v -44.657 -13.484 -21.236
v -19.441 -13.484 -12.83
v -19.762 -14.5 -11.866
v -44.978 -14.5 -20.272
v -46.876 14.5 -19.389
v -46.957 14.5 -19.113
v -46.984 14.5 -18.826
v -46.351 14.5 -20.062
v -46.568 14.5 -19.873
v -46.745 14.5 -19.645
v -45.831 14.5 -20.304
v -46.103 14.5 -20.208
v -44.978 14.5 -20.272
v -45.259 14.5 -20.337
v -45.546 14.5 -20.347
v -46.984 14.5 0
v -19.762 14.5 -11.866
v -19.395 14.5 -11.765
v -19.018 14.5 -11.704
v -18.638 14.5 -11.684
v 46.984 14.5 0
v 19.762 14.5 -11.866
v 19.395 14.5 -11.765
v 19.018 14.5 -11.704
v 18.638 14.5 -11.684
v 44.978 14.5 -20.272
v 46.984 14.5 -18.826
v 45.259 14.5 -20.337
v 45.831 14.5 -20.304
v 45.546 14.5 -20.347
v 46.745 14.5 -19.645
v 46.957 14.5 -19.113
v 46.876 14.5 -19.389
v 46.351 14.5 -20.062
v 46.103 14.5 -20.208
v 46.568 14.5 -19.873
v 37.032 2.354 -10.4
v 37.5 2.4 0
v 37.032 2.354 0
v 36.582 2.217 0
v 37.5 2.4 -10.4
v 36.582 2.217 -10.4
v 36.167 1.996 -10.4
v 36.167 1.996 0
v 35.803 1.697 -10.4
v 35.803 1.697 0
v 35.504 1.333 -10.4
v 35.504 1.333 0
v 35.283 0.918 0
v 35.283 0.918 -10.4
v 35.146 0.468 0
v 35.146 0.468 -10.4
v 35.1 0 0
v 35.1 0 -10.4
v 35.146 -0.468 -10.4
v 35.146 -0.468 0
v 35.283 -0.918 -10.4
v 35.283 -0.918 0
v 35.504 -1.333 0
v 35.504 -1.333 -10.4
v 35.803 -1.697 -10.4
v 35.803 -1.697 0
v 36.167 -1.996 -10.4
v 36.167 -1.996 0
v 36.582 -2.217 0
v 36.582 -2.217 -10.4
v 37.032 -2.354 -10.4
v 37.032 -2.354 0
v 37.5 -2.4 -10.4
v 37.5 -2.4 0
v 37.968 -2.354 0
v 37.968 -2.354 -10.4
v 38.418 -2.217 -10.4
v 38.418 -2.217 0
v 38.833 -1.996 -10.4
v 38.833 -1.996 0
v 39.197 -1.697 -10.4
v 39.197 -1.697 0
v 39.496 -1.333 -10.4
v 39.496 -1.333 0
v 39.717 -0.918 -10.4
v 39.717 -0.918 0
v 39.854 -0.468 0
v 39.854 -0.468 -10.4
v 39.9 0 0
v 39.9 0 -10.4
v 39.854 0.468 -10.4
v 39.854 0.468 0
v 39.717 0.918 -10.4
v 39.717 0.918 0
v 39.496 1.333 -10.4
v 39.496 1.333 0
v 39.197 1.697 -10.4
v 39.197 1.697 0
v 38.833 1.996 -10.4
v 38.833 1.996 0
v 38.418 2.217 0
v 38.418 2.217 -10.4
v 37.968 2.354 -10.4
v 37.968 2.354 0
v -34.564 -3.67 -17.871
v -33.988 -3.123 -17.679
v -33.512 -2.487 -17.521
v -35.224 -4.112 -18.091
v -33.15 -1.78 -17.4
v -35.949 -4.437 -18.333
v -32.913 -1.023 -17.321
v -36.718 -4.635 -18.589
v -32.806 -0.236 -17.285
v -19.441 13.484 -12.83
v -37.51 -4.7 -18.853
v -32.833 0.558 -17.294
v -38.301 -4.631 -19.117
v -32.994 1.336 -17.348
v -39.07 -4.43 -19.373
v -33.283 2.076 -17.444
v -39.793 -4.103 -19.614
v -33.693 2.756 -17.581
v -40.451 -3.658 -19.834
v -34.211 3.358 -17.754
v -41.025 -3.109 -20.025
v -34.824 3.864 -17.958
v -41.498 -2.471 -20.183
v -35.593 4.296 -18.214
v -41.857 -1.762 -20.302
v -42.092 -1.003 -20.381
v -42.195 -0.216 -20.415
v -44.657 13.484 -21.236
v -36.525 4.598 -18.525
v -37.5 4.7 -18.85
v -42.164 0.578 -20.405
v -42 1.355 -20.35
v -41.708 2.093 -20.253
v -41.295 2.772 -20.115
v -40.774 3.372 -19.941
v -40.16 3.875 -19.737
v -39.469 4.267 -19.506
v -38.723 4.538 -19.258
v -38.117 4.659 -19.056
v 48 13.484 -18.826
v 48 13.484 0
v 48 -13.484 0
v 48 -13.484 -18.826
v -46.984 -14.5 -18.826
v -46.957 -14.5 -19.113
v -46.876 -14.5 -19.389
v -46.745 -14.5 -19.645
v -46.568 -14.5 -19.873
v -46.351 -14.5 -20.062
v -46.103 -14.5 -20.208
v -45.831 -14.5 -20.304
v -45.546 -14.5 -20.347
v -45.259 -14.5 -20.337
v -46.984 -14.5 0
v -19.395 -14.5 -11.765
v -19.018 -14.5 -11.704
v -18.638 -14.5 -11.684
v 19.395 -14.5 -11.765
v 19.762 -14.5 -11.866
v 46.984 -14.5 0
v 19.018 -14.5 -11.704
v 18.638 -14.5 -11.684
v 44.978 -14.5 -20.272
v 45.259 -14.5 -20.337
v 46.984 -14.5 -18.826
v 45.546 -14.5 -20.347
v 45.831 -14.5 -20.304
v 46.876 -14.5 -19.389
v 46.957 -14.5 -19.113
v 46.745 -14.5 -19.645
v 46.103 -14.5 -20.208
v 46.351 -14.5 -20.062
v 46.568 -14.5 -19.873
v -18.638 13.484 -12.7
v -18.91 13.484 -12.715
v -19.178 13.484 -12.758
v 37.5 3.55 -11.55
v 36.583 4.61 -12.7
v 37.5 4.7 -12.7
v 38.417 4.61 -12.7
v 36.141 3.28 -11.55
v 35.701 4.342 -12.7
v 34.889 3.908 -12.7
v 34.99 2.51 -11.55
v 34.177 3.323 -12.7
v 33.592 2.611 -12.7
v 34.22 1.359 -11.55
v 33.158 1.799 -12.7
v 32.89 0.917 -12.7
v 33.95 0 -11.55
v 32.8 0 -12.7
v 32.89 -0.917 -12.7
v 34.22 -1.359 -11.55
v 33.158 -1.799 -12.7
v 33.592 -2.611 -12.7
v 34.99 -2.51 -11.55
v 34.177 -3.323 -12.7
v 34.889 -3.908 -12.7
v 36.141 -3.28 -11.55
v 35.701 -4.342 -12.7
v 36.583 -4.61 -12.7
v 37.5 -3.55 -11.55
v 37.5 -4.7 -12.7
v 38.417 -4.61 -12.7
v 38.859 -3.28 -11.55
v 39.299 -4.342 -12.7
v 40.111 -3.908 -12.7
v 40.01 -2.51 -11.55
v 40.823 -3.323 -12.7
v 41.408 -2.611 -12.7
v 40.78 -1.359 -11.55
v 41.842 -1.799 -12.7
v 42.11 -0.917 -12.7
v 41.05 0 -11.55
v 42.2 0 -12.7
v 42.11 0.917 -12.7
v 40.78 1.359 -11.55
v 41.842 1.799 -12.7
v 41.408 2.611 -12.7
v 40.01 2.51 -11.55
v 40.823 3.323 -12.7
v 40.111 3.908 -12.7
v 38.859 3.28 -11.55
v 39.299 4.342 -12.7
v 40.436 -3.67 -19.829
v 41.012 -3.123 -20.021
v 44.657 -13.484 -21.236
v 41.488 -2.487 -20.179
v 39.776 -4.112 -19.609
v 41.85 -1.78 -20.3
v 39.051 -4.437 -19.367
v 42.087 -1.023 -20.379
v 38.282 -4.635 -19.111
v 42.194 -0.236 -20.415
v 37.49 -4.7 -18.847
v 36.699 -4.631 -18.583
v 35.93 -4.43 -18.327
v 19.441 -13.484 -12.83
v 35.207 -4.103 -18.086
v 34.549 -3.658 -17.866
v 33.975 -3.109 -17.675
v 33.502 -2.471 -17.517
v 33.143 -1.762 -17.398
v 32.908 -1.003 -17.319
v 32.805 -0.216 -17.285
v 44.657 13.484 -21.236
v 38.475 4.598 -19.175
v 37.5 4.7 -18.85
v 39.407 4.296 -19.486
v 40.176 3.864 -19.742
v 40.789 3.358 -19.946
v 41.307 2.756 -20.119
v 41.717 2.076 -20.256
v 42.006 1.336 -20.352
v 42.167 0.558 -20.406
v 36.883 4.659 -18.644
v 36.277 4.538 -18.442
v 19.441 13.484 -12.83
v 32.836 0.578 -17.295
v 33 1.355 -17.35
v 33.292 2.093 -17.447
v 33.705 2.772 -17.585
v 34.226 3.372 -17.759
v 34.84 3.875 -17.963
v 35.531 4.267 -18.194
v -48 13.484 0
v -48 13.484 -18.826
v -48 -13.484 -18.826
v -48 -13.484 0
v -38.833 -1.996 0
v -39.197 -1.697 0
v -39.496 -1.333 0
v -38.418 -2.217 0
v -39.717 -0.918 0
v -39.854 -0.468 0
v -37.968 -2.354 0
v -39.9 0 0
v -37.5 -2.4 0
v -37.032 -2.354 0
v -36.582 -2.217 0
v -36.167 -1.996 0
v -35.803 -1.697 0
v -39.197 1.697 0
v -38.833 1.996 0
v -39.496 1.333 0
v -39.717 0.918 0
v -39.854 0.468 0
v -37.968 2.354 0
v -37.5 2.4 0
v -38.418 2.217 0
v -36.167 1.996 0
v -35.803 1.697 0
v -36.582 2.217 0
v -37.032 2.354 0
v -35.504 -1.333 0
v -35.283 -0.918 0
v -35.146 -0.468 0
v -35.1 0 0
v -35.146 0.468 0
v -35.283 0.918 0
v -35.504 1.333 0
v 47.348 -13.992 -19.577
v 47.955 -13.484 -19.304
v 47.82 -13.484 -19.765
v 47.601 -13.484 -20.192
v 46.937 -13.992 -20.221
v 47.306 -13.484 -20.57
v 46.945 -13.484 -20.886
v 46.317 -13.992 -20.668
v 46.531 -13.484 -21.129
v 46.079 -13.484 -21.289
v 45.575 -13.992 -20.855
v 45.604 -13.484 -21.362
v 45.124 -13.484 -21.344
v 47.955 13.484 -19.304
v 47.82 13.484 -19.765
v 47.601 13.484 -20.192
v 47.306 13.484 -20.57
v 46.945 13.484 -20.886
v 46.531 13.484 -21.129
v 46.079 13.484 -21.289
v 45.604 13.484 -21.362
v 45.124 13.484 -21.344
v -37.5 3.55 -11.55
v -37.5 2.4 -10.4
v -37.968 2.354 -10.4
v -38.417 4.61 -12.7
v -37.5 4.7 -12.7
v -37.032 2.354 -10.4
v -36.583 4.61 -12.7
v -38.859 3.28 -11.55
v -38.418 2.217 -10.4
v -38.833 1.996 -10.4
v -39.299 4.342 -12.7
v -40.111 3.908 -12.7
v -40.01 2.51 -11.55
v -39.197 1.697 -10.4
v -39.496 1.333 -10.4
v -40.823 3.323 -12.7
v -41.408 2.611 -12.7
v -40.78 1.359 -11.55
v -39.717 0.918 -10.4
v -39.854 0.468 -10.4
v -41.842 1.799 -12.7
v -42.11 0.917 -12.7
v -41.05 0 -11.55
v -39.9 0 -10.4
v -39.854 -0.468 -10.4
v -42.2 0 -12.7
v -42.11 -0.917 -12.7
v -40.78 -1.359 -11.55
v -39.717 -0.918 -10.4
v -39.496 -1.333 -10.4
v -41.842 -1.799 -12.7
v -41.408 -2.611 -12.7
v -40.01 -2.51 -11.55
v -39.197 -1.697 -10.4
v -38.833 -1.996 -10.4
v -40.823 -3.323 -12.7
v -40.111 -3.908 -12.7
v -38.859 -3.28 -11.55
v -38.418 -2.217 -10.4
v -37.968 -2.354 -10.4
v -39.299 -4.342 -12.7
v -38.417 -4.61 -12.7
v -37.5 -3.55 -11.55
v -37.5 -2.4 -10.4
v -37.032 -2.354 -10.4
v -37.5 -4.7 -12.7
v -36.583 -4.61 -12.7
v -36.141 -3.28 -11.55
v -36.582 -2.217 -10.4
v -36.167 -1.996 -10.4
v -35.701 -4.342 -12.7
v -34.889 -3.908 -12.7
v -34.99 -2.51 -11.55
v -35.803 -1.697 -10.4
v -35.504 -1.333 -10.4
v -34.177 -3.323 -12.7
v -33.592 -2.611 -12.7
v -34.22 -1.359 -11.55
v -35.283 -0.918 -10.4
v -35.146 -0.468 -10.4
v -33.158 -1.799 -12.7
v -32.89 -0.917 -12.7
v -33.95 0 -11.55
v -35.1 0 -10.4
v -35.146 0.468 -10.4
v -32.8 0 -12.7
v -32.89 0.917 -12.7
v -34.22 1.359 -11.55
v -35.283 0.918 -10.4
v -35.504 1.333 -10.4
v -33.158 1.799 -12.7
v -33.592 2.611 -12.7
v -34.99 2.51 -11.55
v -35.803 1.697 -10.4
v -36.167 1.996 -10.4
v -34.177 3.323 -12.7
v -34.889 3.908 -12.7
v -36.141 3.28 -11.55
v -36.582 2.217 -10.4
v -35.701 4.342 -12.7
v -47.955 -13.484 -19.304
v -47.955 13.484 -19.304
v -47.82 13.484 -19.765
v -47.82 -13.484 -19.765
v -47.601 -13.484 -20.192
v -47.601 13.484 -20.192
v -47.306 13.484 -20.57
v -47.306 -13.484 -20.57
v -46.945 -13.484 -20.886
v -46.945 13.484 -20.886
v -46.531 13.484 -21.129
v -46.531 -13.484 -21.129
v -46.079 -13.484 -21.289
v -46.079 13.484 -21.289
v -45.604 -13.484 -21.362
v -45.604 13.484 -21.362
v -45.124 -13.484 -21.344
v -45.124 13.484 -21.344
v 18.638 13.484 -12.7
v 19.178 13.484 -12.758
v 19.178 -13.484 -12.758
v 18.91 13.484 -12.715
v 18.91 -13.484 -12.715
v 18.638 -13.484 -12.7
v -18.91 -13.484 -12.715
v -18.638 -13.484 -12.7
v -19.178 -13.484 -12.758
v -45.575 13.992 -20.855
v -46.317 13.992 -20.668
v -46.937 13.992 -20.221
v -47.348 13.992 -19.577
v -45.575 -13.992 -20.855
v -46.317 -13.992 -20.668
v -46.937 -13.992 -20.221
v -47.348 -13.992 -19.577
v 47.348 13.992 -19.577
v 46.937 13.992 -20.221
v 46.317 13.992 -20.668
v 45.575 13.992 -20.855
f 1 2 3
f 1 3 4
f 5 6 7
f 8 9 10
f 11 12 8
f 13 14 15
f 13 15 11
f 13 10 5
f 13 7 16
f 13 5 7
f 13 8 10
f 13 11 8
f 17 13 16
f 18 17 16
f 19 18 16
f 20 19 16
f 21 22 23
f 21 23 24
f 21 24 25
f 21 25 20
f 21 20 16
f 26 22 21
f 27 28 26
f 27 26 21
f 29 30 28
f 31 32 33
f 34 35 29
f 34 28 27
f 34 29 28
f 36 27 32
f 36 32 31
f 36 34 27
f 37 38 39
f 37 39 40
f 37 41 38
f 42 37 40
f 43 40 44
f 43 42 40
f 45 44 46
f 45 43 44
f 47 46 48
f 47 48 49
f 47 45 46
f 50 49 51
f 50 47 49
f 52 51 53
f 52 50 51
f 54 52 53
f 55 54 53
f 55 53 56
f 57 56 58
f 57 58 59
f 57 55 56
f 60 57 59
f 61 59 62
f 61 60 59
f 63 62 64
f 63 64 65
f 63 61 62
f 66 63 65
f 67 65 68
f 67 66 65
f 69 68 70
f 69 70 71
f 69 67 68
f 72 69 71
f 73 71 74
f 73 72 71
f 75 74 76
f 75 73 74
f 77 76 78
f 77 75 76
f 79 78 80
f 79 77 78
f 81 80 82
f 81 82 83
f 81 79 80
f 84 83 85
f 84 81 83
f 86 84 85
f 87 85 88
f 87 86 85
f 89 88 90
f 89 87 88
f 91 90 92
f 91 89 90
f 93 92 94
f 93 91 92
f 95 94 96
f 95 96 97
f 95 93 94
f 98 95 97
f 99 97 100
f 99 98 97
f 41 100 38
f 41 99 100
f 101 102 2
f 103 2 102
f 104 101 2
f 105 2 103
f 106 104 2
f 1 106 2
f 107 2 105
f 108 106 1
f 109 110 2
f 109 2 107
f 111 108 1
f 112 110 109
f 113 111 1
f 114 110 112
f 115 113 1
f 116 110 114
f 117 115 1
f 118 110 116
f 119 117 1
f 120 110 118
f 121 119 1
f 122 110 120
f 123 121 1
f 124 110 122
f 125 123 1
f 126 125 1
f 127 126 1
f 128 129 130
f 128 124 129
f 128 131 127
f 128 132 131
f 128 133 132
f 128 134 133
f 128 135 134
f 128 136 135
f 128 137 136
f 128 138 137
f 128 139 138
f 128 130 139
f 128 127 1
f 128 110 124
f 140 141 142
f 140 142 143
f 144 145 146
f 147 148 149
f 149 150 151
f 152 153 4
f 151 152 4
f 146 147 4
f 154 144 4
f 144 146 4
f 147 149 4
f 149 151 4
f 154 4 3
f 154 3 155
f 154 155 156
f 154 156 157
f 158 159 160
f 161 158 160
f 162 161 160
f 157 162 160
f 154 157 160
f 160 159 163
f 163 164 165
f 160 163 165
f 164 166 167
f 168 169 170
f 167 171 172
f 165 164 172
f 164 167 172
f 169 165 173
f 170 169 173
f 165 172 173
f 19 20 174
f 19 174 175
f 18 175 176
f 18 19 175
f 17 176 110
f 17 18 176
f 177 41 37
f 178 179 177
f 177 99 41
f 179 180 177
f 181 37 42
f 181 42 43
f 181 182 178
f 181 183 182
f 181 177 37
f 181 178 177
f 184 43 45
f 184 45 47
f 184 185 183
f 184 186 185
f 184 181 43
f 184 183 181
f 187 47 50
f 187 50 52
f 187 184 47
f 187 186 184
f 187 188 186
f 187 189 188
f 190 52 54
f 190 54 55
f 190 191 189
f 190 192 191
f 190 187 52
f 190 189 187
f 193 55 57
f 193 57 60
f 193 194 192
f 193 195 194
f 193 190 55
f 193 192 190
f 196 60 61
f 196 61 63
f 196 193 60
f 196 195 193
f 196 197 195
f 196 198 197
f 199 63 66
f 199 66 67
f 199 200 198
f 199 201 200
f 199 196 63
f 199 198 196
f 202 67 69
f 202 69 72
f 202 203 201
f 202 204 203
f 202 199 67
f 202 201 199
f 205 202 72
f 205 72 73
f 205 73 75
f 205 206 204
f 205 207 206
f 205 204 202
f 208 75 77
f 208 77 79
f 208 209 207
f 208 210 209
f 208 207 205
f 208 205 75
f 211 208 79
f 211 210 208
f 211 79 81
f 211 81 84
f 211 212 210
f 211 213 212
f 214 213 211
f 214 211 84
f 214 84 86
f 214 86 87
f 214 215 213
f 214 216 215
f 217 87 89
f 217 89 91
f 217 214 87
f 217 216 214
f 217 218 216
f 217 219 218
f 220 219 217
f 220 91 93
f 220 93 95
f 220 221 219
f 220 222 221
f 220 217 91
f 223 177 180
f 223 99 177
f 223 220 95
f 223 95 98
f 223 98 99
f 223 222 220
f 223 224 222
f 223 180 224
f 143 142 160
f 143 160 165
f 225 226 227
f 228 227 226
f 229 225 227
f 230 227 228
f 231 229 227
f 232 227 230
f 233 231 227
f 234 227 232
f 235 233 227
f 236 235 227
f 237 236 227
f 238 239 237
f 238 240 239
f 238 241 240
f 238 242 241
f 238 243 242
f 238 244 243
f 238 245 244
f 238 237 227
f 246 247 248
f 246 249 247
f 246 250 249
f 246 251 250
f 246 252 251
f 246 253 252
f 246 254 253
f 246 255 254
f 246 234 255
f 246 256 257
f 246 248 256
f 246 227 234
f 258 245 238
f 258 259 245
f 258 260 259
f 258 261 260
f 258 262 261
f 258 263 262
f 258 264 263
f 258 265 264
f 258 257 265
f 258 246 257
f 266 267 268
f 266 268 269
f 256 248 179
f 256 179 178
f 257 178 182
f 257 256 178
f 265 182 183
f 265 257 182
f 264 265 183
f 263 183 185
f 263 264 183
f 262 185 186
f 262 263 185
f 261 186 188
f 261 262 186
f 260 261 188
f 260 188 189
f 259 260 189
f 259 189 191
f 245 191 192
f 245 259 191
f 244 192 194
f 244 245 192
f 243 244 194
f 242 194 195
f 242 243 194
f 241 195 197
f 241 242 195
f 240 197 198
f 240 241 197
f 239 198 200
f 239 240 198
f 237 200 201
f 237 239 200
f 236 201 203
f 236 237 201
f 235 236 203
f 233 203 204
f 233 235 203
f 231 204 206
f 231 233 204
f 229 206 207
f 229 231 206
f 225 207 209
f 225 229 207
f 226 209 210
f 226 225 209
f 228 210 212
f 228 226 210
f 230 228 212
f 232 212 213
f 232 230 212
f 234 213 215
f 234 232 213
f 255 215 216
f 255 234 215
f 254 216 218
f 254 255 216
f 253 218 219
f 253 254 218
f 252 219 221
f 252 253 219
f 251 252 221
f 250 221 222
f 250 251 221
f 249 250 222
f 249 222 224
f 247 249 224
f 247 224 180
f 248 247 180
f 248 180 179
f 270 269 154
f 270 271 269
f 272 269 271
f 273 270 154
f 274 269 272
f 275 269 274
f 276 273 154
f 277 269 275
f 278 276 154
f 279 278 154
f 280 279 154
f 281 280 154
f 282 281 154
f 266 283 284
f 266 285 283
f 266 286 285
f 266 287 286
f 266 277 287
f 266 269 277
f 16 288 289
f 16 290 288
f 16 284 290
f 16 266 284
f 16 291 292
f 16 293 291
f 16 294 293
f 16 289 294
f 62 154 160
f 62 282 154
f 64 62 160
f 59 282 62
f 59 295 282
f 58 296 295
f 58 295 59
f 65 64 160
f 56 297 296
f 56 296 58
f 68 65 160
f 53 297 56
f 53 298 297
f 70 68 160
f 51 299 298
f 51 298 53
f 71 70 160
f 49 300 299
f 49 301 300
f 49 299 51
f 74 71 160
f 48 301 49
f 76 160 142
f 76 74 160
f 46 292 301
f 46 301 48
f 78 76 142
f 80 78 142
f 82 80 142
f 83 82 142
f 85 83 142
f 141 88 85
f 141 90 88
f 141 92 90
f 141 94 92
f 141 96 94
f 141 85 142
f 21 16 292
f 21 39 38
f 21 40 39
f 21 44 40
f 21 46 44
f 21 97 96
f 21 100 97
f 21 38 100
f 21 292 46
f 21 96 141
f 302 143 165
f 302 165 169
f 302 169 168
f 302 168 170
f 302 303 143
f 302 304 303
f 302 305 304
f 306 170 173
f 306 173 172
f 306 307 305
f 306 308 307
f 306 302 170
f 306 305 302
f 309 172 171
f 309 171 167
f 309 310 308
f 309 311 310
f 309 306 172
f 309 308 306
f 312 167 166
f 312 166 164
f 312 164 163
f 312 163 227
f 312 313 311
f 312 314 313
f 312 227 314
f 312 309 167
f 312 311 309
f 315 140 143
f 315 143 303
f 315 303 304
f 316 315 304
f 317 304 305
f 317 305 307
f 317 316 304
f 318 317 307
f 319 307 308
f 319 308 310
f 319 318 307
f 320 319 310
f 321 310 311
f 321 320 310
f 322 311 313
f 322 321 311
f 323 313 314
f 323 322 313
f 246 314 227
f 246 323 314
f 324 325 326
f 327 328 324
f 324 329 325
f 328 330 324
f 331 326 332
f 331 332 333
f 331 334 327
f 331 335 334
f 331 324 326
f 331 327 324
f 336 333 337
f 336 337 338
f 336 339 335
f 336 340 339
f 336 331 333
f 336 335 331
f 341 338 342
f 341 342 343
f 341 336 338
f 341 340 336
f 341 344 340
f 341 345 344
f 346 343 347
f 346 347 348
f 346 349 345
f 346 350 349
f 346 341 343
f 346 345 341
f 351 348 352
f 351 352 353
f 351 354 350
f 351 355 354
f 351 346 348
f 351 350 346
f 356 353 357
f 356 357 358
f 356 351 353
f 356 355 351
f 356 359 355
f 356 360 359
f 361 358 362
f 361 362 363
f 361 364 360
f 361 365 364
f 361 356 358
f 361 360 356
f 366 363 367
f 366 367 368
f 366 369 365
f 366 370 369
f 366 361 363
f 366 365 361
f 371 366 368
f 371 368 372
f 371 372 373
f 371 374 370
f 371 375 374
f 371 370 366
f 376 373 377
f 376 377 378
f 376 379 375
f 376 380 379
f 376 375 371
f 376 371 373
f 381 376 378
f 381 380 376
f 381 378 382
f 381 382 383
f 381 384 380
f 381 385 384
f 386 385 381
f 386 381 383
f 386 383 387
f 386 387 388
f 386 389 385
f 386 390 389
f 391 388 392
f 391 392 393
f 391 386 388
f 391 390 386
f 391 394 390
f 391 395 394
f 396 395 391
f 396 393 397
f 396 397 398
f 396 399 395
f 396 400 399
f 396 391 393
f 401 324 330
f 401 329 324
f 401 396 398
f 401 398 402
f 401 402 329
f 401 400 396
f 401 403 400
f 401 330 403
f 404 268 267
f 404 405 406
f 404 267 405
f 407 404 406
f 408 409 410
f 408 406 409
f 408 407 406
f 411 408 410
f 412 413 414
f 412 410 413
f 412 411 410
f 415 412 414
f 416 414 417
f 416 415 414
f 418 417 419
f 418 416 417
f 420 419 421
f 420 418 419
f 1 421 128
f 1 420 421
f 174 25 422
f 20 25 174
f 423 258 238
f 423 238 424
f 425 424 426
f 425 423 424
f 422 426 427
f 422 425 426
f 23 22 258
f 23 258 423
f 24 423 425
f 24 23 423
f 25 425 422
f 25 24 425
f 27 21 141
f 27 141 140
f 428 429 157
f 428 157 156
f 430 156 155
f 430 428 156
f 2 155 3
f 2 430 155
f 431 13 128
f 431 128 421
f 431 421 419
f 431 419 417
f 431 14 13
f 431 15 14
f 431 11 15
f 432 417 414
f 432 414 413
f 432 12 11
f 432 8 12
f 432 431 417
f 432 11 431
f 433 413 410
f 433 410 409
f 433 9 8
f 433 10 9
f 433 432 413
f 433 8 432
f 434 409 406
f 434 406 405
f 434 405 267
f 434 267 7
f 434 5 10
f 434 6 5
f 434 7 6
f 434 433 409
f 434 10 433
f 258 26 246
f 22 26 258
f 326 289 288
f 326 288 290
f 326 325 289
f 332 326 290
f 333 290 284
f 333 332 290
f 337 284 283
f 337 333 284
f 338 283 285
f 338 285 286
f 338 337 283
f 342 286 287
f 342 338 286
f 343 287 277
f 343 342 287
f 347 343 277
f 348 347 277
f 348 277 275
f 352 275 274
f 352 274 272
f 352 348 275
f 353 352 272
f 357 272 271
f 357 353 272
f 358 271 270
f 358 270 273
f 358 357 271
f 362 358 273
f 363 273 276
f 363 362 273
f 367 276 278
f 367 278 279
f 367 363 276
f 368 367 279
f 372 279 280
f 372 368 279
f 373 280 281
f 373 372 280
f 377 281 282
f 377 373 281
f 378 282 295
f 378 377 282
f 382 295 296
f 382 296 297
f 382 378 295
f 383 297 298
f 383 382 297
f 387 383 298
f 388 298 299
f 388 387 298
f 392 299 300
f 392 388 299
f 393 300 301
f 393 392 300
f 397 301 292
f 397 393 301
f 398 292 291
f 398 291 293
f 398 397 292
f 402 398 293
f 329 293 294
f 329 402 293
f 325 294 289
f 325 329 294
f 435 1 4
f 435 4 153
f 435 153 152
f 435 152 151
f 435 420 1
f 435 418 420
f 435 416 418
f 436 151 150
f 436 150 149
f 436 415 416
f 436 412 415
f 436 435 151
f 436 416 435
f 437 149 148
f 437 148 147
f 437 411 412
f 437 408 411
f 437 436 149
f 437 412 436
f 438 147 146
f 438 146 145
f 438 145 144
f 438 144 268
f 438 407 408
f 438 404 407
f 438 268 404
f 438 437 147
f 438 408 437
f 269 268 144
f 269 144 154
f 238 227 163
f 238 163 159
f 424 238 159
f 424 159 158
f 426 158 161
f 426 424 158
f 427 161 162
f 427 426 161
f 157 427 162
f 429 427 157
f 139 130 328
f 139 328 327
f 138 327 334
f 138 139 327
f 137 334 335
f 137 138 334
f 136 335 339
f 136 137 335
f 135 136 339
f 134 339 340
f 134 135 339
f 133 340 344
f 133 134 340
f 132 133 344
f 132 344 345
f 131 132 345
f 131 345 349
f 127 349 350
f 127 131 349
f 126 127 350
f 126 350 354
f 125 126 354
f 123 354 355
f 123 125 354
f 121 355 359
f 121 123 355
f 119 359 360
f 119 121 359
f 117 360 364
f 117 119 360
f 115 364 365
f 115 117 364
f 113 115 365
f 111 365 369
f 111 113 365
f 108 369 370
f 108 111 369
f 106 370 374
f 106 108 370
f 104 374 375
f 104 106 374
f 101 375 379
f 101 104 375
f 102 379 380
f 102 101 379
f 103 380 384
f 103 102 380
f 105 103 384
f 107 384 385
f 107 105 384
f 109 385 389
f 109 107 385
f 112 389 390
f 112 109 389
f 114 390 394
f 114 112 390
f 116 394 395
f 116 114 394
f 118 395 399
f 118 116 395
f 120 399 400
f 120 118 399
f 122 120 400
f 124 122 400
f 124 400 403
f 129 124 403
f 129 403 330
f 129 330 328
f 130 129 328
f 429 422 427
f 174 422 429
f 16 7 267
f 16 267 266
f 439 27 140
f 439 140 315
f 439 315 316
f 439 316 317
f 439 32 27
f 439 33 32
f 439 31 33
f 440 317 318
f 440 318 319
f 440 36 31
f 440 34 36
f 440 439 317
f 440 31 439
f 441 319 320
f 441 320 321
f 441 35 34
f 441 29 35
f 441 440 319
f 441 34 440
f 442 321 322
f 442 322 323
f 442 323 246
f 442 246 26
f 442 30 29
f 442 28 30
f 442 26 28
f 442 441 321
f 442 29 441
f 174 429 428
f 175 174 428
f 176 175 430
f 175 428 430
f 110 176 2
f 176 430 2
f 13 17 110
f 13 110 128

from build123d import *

# Parameters (mm, degrees)
BOSS_EXTRUDE1_DEPTH                            = 14.5
CSK_FOR_M4_FLAT_HEAD_MACHINE_SCREW1_AT_2_COUNT = 2
CSK_FOR_M4_FLAT_HEAD_MACHINE_SCREW1_AT_2_PITCH = 75
FILLET1_R                                      = 2.54
CHAMFER1_SIZE                                  = 1.016


with BuildPart() as part:
    # Sketch1 → Boss-Extrude1 (new, symmetric)
    with BuildSketch(Plane(origin=(0, 0, 0), x_dir=(1, 0, 0), z_dir=(0, 1, 0))):
        Polygon((-48, 0), (48, 0), (48, 22.35), (19.05, 12.7), (-19.05, 12.7), (-48, 22.35), align=None)
    extrude(amount=BOSS_EXTRUDE1_DEPTH, both=True)

    # Sketch5 → CSK for M4 Flat Head Machine Screw1 (revolve, cut)
    with BuildSketch(Plane(origin=(-37.5, 0, -25.4), x_dir=(0, 1, 0), z_dir=(1, 0, 0))):
        Polygon((0, 0), (0, 25.4), (2.4, 25.4), (2.4, 15), (4.7, 12.7), (4.7, 0), align=None)
    csk_for_m4_flat_head_machine_screw1 = revolve(axis=Axis((-37.5, 0, -31.75), (0, 0, 1)), mode=Mode.SUBTRACT)

    # CSK for M4 Flat Head Machine Screw1 at 2: CSK for M4 Flat Head Machine Screw1 ×2
    with Locations(*[(i * CSK_FOR_M4_FLAT_HEAD_MACHINE_SCREW1_AT_2_PITCH, 0, 0) for i in range(1, CSK_FOR_M4_FLAT_HEAD_MACHINE_SCREW1_AT_2_COUNT)]):
        add(csk_for_m4_flat_head_machine_screw1, mode=Mode.SUBTRACT)

    # Fillet1
    fillet1_edges = [part.edges().sort_by_distance(p)[0] for p in [
        (-48, 0, -22.35),
        (-19.05, 0, -12.7),
        (19.05, 0, -12.7),
        (48, 0, -22.35),
    ]]
    fillet(fillet1_edges, radius=FILLET1_R)

    # Chamfer1
    chamfer1_edges = [part.edges().sort_by_distance(p)[0] for p in [
        (-48, -14.5, -9.412969124),
        (-48, 14.5, -9.412969124),
        (-32.048907372, -14.5, -17.032969124),
        (0, -14.5, -12.7),
        (32.048907372, -14.5, -17.032969124),
        (46.945164123, -14.5, -20.886493398),
        (-46.945164123, -14.5, -20.886493398),
        (-32.048907372, 14.5, -17.032969124),
        (32.048907372, 14.5, -17.032969124),
        (0, 14.5, -12.7),
        (46.945164123, 14.5, -20.886493398),
        (-46.945164123, 14.5, -20.886493398),
        (-19.04467764, -14.5, -12.732797858),
        (-19.04467764, 14.5, -12.732797858),
        (19.04467764, -14.5, -12.732797858),
        (19.04467764, 14.5, -12.732797858),
        (48, 14.5, -9.412969124),
        (48, -14.5, -9.412969124),
    ]]
    chamfer(chamfer1_edges, length=CHAMFER1_SIZE)


solid = part.part
